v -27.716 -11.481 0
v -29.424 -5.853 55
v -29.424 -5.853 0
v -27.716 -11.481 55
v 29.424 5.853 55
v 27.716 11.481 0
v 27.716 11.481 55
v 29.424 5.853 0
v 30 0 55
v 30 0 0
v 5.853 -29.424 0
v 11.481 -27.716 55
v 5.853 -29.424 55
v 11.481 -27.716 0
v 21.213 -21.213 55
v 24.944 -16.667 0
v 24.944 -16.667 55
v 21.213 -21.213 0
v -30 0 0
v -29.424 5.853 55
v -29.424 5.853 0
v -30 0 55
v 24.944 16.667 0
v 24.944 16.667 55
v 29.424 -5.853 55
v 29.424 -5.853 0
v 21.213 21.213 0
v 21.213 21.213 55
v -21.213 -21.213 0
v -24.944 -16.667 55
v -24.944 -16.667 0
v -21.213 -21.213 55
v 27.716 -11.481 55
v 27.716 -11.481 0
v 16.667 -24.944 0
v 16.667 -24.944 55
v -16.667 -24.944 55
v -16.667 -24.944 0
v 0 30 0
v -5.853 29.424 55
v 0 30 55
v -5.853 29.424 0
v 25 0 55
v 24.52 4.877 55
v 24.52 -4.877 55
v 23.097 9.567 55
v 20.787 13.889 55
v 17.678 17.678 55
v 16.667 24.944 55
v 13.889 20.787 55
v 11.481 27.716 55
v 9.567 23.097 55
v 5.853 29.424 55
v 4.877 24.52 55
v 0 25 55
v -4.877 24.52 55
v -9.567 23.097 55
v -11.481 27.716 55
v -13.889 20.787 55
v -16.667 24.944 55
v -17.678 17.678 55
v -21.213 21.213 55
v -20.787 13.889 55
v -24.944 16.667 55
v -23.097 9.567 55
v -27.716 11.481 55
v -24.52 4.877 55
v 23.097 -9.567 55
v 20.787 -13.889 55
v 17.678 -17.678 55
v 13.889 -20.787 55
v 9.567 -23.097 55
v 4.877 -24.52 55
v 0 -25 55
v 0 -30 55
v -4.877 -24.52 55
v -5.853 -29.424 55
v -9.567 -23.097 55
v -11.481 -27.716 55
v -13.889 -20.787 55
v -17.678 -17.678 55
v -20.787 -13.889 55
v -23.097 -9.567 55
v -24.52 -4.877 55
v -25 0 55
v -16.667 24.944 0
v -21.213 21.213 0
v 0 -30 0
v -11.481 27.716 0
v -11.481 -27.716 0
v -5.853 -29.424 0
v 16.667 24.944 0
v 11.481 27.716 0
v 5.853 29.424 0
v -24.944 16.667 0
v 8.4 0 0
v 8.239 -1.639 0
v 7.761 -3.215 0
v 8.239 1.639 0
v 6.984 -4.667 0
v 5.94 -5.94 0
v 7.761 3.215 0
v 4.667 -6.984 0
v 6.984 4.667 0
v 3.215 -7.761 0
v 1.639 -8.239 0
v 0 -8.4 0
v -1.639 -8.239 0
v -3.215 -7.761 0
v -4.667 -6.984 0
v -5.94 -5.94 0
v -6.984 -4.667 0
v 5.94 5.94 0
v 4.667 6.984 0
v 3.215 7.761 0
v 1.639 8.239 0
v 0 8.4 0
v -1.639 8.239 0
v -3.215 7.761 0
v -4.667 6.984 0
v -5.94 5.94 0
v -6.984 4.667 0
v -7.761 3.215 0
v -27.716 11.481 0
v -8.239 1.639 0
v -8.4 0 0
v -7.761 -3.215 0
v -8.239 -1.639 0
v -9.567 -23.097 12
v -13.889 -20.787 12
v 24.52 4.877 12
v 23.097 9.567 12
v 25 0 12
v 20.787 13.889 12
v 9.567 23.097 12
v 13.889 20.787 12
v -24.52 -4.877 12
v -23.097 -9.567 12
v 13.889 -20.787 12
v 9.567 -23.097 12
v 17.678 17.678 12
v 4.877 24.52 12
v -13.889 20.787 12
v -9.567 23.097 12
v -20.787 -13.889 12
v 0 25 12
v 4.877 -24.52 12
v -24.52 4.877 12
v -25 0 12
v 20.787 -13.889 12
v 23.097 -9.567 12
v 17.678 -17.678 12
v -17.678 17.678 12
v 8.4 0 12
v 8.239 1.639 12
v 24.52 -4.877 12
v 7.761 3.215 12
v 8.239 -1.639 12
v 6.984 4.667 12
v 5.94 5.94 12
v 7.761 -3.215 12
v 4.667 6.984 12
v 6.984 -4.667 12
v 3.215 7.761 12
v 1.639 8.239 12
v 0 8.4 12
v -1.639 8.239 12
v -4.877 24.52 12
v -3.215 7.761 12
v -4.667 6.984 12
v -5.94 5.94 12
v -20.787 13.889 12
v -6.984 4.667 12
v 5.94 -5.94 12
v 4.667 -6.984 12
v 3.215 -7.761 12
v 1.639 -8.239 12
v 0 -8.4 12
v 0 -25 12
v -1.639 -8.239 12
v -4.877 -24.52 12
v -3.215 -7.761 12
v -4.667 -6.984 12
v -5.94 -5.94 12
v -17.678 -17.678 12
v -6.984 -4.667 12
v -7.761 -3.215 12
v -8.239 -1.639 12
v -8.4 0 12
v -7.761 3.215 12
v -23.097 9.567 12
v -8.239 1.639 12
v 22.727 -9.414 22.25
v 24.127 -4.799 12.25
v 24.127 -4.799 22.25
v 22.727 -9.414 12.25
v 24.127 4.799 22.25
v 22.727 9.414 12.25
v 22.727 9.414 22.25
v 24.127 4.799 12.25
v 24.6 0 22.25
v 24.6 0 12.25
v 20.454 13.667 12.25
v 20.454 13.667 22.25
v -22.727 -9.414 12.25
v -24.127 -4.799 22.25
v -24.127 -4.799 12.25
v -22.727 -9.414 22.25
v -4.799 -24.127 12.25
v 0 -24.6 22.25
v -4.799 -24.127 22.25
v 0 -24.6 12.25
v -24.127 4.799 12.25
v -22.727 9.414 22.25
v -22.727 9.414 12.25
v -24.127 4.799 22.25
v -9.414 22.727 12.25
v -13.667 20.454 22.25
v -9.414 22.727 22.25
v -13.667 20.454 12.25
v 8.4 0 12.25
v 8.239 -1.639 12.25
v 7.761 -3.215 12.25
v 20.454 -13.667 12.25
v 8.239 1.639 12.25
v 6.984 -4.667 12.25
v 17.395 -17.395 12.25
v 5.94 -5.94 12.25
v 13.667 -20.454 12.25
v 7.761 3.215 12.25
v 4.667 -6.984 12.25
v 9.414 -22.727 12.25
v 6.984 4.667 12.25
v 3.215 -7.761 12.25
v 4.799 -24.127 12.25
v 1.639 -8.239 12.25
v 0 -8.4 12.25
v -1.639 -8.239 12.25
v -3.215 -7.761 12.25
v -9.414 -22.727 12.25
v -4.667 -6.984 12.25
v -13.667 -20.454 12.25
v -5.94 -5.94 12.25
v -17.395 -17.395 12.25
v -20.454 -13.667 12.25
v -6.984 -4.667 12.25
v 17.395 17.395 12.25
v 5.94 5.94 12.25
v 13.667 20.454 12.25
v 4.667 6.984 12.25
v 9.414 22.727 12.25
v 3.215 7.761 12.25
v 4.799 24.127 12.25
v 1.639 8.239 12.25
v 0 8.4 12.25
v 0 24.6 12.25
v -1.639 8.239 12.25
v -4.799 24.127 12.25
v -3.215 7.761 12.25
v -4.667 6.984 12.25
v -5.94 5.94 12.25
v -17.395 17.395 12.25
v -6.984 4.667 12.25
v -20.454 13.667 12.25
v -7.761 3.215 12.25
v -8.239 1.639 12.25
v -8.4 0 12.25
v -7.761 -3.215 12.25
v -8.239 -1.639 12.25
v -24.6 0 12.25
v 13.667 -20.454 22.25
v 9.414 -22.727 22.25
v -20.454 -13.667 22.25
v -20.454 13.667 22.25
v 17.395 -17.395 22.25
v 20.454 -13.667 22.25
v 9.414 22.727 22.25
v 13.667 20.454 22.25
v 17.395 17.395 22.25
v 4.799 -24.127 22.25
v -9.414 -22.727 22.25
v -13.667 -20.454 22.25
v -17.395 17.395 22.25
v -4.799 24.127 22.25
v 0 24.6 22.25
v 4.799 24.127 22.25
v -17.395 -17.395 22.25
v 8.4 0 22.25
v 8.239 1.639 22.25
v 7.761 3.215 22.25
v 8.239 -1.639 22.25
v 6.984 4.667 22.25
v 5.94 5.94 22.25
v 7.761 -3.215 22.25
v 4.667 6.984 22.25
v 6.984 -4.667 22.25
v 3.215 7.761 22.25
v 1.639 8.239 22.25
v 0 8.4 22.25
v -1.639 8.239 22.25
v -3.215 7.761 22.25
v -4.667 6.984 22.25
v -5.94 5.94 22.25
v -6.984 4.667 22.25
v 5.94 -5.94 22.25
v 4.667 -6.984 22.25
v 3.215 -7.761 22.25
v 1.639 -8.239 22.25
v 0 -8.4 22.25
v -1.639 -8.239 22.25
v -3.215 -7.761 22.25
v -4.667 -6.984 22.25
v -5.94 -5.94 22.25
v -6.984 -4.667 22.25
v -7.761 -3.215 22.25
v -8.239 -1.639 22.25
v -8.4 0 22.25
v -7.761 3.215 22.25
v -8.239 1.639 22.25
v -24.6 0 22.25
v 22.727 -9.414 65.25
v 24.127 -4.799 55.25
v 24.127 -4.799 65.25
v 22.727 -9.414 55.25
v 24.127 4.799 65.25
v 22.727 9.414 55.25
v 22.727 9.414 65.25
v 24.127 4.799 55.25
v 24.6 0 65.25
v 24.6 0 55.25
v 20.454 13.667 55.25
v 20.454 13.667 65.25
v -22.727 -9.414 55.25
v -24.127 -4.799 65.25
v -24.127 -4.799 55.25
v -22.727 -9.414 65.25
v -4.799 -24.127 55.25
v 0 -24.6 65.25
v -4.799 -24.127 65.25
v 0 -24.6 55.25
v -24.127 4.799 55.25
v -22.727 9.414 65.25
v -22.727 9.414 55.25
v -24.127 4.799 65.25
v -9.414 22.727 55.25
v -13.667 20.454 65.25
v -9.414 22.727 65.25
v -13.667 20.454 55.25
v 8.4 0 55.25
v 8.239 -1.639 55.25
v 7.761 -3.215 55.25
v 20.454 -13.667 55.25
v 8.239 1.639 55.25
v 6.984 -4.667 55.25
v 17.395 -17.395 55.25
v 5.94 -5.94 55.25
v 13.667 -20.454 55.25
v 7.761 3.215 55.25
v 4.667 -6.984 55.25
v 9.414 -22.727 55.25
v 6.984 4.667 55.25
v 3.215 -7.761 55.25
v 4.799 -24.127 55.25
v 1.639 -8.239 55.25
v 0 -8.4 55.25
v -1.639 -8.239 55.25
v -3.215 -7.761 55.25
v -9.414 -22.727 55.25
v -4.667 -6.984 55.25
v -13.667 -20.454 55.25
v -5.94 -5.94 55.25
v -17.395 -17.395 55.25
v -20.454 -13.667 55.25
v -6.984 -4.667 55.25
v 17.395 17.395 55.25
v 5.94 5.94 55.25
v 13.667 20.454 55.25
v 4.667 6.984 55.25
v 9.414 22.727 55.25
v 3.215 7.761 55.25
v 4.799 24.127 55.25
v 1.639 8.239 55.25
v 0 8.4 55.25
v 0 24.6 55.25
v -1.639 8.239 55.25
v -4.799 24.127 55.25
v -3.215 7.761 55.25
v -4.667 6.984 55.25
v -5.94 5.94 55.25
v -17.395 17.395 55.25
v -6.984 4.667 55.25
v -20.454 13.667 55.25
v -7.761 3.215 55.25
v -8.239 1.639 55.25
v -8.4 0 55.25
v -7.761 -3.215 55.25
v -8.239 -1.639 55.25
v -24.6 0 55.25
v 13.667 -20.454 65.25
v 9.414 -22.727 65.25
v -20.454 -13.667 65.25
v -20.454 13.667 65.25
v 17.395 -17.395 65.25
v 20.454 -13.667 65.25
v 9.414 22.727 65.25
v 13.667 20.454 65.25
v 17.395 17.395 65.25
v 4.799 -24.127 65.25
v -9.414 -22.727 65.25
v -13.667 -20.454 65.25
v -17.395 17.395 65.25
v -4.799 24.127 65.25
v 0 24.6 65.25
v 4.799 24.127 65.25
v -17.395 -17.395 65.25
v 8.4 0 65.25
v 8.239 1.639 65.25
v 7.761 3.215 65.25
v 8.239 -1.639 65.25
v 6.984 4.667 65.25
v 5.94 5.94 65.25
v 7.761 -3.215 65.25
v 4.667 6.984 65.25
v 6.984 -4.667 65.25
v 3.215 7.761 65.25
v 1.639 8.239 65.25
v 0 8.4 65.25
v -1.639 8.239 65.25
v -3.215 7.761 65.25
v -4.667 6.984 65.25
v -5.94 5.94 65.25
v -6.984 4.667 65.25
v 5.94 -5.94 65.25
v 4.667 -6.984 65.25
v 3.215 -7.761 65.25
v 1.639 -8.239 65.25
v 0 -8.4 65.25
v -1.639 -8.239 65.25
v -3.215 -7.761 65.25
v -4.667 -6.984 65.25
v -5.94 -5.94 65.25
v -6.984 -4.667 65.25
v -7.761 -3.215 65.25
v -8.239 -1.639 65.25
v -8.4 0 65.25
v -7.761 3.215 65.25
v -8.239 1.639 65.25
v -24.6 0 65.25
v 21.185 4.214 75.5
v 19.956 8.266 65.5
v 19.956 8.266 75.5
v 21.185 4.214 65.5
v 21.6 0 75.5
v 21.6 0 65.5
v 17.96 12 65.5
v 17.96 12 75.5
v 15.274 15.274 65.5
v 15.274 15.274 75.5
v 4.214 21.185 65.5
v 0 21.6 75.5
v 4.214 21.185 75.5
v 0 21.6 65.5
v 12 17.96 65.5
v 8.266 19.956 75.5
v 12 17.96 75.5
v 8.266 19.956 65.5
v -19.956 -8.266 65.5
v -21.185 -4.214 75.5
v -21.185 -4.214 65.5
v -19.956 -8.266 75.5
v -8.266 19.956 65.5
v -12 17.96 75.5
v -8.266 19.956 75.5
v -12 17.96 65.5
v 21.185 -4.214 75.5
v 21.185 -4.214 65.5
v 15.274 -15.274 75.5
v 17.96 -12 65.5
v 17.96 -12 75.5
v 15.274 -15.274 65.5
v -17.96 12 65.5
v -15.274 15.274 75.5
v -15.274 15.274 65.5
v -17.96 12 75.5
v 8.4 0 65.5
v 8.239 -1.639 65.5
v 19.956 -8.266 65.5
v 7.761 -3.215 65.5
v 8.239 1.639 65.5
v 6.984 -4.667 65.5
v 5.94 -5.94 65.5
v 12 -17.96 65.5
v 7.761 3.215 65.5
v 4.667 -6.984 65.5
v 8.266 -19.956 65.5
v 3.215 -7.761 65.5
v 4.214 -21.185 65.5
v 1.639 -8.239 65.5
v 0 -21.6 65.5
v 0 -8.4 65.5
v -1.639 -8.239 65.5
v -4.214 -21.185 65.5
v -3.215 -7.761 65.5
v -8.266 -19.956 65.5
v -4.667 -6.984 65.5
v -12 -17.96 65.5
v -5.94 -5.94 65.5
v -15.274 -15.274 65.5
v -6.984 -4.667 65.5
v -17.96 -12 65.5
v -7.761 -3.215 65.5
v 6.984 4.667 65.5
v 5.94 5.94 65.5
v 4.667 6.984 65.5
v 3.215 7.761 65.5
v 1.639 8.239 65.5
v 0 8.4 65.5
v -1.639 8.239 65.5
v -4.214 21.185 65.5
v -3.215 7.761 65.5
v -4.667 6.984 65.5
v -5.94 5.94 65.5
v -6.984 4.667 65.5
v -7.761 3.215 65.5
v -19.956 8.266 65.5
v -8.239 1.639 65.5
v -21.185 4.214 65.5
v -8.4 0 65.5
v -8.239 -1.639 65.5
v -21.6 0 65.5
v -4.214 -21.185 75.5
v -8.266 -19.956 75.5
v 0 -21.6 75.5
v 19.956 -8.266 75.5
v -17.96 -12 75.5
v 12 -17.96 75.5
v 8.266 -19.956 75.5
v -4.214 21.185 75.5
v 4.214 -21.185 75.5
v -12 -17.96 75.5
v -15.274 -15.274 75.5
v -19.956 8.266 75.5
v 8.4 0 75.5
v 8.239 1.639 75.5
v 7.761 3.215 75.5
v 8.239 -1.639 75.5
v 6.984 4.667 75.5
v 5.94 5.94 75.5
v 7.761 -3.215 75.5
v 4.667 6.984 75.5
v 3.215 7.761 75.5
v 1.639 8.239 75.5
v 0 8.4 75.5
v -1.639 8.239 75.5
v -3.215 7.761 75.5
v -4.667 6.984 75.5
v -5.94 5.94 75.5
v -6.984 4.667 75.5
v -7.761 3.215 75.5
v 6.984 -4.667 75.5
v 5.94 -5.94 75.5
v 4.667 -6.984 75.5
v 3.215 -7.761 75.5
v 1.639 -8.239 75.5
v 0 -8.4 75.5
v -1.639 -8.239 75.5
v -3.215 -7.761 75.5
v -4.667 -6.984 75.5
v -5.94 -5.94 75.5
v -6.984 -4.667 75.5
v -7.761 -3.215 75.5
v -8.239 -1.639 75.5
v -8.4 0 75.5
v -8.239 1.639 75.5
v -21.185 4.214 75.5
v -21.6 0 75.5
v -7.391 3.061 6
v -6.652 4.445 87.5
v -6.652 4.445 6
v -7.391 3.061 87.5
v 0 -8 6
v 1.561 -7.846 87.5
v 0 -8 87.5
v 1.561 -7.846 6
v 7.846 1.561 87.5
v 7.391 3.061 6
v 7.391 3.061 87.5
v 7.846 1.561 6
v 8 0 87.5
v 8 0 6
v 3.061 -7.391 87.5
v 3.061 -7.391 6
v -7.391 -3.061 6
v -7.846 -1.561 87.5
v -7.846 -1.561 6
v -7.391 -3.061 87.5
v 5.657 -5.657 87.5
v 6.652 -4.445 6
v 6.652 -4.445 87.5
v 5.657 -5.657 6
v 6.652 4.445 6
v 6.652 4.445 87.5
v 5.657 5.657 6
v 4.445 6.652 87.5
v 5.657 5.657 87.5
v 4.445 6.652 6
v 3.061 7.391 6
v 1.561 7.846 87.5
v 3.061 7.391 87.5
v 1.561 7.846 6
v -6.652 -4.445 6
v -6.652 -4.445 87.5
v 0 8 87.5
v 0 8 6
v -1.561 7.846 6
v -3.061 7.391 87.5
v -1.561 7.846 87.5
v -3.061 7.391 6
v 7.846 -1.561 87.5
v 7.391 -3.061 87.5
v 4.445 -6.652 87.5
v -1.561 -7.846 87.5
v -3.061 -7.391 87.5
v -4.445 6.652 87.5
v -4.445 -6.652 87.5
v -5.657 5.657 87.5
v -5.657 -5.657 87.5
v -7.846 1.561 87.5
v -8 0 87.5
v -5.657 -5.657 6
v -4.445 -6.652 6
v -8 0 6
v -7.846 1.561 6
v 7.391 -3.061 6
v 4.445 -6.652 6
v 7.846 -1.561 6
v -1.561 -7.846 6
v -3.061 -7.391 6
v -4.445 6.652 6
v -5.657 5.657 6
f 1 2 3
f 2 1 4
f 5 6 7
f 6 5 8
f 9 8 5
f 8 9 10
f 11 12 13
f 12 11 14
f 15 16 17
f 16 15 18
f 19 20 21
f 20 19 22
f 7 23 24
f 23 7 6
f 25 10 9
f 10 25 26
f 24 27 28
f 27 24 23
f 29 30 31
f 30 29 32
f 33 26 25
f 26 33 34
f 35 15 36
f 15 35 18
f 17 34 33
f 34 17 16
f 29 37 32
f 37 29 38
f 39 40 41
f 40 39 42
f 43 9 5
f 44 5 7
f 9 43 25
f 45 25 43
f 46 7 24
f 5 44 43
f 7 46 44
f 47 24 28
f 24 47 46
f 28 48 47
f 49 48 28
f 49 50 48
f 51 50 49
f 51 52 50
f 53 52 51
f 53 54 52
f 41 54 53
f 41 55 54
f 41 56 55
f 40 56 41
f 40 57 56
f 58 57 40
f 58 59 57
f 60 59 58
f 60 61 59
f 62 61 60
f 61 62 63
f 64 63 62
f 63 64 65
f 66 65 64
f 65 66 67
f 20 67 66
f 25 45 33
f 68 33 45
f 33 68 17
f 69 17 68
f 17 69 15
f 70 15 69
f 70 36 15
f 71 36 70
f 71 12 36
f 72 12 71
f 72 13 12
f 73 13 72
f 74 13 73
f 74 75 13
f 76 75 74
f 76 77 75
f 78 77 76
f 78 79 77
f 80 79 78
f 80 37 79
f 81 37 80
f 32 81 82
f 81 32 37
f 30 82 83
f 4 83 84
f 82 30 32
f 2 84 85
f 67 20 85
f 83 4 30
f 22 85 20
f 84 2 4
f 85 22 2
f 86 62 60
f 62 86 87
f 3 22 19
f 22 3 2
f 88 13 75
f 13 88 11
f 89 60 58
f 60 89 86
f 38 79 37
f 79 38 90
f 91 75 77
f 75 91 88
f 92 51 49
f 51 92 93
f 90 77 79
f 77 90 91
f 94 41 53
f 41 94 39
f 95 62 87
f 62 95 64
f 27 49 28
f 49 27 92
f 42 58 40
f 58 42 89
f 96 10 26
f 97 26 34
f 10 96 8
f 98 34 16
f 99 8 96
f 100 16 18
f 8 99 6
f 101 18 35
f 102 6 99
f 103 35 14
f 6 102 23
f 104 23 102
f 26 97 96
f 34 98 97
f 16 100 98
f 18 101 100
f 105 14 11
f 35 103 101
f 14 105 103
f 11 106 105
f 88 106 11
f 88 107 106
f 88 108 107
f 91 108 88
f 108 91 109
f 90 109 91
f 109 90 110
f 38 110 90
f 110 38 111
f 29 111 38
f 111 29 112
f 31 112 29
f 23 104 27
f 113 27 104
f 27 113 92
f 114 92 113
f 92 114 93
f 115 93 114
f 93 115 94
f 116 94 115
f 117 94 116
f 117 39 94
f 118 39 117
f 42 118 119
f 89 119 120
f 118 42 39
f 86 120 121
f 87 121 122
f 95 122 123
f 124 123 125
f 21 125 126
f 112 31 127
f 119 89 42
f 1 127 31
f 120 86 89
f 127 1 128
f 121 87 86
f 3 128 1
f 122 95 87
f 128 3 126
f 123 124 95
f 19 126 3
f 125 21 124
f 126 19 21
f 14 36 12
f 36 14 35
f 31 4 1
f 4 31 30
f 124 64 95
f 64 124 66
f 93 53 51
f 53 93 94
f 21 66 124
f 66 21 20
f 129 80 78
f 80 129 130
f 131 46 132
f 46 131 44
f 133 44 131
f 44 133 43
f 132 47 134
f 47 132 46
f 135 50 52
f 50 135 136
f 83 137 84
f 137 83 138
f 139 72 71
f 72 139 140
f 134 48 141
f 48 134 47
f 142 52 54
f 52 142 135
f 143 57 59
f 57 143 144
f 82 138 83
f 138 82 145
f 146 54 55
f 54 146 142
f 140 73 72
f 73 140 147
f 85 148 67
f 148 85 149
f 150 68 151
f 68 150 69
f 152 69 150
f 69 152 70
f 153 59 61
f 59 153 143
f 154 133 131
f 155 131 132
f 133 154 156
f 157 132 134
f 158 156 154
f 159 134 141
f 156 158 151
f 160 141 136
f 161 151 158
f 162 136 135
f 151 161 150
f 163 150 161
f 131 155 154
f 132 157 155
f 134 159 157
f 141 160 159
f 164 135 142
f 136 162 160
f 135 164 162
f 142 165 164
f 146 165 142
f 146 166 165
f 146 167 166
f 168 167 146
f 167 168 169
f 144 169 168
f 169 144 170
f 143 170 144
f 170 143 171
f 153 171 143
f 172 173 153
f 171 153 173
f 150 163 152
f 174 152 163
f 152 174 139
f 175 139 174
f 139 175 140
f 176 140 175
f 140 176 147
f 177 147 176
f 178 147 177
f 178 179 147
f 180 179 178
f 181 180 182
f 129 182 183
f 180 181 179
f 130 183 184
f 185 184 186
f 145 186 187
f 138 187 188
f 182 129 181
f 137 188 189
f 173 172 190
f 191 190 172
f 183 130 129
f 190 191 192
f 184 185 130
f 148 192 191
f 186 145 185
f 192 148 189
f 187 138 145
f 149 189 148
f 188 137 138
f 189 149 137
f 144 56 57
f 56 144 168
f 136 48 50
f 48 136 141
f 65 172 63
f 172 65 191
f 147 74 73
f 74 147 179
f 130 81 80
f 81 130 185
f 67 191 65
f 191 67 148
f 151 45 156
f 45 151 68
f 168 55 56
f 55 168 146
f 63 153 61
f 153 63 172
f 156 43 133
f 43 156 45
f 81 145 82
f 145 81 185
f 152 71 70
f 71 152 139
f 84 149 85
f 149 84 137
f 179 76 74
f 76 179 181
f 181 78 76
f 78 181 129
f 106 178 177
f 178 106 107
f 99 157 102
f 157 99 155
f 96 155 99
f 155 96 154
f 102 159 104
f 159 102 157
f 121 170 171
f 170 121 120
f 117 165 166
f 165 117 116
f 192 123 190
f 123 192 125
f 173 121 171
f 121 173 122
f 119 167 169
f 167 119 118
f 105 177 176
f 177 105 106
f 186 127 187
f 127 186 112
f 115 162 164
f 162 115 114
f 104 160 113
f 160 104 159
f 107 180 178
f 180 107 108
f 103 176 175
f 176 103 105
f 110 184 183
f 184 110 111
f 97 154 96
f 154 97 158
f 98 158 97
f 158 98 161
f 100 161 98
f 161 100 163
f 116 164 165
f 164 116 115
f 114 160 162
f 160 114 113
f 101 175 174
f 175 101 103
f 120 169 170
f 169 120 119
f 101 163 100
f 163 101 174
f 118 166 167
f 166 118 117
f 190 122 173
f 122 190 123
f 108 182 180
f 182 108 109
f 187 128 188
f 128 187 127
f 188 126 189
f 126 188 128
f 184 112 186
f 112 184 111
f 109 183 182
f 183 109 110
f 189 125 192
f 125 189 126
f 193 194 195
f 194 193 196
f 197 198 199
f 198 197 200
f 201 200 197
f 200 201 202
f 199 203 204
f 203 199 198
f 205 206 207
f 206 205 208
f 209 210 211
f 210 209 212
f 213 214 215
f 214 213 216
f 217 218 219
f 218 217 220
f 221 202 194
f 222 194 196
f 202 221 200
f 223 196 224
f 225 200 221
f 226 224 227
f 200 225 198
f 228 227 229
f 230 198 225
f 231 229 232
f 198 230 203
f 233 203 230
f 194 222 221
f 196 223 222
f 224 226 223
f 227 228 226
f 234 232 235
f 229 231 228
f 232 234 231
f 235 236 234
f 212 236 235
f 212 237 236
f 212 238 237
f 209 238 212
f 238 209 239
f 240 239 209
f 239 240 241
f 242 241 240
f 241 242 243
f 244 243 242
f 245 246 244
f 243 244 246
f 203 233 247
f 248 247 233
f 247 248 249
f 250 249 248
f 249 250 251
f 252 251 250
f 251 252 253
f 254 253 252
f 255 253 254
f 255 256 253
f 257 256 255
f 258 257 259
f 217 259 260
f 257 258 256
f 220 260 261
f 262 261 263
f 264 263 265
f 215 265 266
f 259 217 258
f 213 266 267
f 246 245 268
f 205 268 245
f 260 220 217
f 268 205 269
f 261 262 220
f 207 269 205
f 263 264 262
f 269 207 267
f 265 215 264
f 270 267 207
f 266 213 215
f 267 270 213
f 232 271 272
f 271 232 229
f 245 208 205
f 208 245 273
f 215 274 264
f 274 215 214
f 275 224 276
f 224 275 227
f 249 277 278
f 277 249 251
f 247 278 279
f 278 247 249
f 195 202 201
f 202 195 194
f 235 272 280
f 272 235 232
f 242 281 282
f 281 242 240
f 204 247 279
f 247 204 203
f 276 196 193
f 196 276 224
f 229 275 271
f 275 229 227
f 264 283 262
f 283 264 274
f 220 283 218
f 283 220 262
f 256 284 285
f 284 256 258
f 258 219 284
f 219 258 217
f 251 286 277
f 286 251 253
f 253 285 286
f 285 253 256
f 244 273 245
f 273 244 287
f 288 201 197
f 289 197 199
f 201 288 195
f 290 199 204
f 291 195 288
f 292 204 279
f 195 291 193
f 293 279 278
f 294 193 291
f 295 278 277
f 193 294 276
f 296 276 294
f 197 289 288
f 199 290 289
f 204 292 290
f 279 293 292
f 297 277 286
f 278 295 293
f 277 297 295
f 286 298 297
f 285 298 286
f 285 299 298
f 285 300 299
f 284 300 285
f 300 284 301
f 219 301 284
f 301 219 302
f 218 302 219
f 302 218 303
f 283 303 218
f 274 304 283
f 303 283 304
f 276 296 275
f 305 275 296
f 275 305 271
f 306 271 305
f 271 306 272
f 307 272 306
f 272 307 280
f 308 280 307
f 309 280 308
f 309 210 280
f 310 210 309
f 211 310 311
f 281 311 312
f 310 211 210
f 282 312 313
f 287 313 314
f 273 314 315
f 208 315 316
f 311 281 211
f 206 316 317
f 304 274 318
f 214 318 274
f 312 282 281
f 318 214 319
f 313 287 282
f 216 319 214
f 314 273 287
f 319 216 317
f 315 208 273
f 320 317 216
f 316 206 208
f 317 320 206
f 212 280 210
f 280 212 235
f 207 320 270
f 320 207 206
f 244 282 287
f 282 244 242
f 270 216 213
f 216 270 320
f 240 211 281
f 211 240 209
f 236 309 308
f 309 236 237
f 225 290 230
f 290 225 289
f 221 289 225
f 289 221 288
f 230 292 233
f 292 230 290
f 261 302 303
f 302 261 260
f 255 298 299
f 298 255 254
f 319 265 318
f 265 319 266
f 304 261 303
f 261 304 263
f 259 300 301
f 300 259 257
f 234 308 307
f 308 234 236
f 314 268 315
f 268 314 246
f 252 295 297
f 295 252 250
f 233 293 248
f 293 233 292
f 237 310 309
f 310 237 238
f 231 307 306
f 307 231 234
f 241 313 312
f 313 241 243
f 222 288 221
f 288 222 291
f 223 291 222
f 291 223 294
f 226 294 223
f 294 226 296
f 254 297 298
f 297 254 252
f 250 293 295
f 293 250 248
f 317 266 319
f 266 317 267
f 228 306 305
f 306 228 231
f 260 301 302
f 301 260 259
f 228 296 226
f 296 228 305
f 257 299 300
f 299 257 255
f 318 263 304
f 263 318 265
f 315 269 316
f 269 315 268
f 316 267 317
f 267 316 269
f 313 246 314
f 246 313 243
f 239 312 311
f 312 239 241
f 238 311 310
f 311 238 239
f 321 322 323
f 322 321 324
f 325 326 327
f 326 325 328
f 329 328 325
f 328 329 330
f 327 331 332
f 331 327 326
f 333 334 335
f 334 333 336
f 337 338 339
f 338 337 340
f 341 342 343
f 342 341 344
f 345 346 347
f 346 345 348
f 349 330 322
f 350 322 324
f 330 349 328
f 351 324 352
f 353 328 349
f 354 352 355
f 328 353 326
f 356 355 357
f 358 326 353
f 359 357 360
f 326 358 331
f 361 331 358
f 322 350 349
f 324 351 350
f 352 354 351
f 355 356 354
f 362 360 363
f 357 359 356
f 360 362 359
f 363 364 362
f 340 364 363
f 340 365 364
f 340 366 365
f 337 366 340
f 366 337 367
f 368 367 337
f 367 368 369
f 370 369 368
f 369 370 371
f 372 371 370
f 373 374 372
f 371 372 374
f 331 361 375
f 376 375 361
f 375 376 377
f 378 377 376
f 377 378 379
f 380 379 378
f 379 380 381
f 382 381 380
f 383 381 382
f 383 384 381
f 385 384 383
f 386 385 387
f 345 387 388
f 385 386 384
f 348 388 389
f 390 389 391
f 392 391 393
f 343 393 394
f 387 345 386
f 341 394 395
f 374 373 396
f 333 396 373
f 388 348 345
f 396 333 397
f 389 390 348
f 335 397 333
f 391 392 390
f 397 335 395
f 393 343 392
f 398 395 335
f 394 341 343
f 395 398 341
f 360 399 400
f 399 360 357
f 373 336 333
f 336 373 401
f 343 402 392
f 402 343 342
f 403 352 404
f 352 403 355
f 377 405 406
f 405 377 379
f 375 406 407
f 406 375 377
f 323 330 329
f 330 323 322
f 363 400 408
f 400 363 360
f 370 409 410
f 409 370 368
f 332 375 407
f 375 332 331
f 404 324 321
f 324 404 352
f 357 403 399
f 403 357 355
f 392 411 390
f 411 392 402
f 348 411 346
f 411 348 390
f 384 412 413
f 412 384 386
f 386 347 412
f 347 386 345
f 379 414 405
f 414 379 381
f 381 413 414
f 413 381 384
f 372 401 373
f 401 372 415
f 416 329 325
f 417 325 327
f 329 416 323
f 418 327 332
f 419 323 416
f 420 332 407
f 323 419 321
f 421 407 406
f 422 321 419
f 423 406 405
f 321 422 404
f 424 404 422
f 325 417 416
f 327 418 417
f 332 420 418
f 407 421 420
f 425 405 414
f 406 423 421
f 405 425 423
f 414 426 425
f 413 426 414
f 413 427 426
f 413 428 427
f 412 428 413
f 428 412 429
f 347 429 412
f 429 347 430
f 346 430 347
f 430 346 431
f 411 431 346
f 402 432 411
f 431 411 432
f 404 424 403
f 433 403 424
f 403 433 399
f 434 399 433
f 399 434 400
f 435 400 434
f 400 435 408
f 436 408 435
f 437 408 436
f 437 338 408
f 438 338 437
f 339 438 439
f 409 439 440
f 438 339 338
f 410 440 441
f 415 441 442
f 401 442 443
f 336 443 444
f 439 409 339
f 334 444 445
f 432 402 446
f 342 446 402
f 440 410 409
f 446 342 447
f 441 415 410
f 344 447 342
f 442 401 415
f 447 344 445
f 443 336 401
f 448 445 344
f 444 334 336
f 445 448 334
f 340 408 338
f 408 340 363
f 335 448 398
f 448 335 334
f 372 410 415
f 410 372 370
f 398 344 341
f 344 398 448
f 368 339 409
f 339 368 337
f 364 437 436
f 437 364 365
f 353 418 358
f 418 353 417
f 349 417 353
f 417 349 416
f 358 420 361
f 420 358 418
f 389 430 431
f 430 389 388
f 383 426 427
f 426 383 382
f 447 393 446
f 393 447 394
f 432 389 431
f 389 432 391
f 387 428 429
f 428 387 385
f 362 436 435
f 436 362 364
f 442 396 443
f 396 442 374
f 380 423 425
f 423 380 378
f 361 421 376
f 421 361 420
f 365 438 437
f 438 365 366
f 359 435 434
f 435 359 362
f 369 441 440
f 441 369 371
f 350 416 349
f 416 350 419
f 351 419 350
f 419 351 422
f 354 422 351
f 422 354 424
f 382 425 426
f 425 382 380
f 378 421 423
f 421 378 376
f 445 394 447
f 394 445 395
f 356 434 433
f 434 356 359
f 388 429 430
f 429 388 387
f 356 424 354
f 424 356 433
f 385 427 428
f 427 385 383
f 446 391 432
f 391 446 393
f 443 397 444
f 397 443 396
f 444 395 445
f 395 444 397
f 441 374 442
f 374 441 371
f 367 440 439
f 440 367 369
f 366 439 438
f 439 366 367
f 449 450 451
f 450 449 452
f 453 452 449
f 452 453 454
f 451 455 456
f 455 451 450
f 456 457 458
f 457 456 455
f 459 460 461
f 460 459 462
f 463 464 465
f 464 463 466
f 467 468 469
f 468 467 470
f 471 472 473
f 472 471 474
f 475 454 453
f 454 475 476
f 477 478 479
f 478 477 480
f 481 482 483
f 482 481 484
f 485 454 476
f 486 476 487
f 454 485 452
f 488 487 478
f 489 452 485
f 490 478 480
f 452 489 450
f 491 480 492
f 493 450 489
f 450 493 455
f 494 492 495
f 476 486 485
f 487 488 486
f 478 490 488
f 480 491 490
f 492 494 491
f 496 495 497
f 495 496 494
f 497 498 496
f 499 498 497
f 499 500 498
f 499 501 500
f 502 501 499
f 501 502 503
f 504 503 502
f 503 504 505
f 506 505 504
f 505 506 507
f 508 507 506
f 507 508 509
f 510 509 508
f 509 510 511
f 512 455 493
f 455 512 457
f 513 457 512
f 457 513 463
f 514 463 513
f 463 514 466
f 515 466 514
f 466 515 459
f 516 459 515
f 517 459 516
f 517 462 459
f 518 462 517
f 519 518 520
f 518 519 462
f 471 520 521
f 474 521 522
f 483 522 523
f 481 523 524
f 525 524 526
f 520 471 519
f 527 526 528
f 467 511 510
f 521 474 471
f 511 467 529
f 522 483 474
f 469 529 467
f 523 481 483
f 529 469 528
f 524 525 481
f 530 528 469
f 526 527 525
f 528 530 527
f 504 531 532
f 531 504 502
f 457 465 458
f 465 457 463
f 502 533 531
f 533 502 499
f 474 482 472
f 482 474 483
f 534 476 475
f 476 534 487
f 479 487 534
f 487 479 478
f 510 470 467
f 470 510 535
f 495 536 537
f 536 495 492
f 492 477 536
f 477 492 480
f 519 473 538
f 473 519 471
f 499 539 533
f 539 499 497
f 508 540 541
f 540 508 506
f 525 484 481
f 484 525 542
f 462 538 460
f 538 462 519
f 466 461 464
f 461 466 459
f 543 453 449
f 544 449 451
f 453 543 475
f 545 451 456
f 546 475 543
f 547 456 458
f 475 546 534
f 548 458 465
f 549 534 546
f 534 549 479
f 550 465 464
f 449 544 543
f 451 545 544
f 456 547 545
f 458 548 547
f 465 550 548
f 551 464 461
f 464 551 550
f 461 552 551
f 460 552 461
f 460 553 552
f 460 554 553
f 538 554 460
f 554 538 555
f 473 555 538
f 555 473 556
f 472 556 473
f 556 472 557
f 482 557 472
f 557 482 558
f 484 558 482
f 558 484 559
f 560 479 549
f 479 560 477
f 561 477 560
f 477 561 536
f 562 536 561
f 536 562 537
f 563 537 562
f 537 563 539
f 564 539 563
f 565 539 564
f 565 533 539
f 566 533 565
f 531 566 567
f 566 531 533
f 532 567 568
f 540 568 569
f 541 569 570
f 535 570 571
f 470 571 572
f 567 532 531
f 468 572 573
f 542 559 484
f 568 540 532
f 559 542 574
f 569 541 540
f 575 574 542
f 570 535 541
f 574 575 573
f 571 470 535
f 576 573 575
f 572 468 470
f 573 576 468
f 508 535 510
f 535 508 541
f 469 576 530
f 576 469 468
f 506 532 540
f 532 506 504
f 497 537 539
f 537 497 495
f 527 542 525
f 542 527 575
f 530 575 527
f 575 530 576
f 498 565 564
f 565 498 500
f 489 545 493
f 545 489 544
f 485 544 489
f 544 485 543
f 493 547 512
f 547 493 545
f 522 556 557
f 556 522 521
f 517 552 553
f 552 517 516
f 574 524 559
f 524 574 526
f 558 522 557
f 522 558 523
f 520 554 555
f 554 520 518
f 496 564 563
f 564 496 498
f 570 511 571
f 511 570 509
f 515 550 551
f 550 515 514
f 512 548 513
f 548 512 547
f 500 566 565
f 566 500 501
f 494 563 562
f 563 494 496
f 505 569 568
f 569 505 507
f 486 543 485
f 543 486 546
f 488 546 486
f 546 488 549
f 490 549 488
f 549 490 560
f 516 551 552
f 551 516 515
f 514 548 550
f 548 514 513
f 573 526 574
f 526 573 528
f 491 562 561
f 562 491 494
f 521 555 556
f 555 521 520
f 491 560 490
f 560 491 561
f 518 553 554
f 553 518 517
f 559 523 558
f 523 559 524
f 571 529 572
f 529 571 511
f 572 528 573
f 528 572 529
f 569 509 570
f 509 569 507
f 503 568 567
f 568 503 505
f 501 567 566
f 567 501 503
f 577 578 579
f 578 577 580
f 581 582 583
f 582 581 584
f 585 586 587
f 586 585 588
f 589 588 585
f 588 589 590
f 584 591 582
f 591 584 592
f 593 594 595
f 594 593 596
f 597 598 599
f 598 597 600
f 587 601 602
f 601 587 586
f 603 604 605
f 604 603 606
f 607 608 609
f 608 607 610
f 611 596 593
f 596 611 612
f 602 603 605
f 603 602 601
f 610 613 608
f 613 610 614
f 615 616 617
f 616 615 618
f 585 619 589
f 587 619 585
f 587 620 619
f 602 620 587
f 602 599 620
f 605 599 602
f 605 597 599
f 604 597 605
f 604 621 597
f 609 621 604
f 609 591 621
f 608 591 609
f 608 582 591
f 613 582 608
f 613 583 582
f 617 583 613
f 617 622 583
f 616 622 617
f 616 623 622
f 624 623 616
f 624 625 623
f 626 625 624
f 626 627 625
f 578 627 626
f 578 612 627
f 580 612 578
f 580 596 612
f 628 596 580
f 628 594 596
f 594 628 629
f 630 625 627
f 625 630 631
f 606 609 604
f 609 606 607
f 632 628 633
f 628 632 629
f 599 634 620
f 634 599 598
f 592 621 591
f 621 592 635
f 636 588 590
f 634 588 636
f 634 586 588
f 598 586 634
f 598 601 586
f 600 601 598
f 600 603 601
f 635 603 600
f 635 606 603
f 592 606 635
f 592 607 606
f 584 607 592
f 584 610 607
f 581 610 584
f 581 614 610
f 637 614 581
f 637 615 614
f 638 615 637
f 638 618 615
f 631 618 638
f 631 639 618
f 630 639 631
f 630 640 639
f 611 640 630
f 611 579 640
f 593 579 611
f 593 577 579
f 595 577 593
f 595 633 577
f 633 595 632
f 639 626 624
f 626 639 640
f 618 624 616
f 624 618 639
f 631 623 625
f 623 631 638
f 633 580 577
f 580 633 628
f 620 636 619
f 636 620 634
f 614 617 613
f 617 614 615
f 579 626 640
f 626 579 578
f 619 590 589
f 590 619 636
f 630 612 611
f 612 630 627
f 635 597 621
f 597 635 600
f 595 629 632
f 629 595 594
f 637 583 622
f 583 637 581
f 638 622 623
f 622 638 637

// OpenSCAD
$fn = 32;

// ------------------------------------------------------------------------
// Bearing housing: housing d60, two bearings and a shaft
// Every part is its own module, assembly() places them once.
// ------------------------------------------------------------------------

// --- part 1 ---
module housing() {
  difference() {
    cylinder(h = 55, d = 60);
    translate([0, 0, 12]) cylinder(h = 44, d = 50);
    translate([0, 0, -1]) cylinder(h = 14, d = 16.8);
  }
}

// --- part 2 ---
module bearing_lower() {
  difference() {
      translate([0, 0, 0]) cylinder(h = 10, d = 49.2);
      translate([0, 0, -1]) cylinder(h = 12, d = 16.8);
    }
}

// --- part 3 ---
module bearing_upper() {
  difference() {
      translate([0, 0, 0]) cylinder(h = 10, d = 49.2);
      translate([0, 0, -1]) cylinder(h = 12, d = 16.8);
    }
}

// --- part 4 ---
module spacer() {
  difference() {
      translate([0, 0, 0]) cylinder(h = 10, d = 43.2);
      translate([0, 0, -1]) cylinder(h = 12, d = 16.8);
    }
}

// --- part 5 ---
module shaft() {
  translate([0, 0, -40.75]) cylinder(h = 81.5, d = 16);
}

// --- assembly ---
module assembly() {
  translate([0, 0, 0]) rotate([0, 0, 0]) housing();
  translate([0, 0, 12.25]) rotate([0, 0, 0]) bearing_lower();
  translate([0, 0, 55.25]) rotate([0, 0, 0]) bearing_upper();
  translate([0, 0, 65.5]) rotate([0, 0, 0]) spacer();
  translate([0, 0, 46.75]) rotate([0, 0, 0]) shaft();
}

assembly();
